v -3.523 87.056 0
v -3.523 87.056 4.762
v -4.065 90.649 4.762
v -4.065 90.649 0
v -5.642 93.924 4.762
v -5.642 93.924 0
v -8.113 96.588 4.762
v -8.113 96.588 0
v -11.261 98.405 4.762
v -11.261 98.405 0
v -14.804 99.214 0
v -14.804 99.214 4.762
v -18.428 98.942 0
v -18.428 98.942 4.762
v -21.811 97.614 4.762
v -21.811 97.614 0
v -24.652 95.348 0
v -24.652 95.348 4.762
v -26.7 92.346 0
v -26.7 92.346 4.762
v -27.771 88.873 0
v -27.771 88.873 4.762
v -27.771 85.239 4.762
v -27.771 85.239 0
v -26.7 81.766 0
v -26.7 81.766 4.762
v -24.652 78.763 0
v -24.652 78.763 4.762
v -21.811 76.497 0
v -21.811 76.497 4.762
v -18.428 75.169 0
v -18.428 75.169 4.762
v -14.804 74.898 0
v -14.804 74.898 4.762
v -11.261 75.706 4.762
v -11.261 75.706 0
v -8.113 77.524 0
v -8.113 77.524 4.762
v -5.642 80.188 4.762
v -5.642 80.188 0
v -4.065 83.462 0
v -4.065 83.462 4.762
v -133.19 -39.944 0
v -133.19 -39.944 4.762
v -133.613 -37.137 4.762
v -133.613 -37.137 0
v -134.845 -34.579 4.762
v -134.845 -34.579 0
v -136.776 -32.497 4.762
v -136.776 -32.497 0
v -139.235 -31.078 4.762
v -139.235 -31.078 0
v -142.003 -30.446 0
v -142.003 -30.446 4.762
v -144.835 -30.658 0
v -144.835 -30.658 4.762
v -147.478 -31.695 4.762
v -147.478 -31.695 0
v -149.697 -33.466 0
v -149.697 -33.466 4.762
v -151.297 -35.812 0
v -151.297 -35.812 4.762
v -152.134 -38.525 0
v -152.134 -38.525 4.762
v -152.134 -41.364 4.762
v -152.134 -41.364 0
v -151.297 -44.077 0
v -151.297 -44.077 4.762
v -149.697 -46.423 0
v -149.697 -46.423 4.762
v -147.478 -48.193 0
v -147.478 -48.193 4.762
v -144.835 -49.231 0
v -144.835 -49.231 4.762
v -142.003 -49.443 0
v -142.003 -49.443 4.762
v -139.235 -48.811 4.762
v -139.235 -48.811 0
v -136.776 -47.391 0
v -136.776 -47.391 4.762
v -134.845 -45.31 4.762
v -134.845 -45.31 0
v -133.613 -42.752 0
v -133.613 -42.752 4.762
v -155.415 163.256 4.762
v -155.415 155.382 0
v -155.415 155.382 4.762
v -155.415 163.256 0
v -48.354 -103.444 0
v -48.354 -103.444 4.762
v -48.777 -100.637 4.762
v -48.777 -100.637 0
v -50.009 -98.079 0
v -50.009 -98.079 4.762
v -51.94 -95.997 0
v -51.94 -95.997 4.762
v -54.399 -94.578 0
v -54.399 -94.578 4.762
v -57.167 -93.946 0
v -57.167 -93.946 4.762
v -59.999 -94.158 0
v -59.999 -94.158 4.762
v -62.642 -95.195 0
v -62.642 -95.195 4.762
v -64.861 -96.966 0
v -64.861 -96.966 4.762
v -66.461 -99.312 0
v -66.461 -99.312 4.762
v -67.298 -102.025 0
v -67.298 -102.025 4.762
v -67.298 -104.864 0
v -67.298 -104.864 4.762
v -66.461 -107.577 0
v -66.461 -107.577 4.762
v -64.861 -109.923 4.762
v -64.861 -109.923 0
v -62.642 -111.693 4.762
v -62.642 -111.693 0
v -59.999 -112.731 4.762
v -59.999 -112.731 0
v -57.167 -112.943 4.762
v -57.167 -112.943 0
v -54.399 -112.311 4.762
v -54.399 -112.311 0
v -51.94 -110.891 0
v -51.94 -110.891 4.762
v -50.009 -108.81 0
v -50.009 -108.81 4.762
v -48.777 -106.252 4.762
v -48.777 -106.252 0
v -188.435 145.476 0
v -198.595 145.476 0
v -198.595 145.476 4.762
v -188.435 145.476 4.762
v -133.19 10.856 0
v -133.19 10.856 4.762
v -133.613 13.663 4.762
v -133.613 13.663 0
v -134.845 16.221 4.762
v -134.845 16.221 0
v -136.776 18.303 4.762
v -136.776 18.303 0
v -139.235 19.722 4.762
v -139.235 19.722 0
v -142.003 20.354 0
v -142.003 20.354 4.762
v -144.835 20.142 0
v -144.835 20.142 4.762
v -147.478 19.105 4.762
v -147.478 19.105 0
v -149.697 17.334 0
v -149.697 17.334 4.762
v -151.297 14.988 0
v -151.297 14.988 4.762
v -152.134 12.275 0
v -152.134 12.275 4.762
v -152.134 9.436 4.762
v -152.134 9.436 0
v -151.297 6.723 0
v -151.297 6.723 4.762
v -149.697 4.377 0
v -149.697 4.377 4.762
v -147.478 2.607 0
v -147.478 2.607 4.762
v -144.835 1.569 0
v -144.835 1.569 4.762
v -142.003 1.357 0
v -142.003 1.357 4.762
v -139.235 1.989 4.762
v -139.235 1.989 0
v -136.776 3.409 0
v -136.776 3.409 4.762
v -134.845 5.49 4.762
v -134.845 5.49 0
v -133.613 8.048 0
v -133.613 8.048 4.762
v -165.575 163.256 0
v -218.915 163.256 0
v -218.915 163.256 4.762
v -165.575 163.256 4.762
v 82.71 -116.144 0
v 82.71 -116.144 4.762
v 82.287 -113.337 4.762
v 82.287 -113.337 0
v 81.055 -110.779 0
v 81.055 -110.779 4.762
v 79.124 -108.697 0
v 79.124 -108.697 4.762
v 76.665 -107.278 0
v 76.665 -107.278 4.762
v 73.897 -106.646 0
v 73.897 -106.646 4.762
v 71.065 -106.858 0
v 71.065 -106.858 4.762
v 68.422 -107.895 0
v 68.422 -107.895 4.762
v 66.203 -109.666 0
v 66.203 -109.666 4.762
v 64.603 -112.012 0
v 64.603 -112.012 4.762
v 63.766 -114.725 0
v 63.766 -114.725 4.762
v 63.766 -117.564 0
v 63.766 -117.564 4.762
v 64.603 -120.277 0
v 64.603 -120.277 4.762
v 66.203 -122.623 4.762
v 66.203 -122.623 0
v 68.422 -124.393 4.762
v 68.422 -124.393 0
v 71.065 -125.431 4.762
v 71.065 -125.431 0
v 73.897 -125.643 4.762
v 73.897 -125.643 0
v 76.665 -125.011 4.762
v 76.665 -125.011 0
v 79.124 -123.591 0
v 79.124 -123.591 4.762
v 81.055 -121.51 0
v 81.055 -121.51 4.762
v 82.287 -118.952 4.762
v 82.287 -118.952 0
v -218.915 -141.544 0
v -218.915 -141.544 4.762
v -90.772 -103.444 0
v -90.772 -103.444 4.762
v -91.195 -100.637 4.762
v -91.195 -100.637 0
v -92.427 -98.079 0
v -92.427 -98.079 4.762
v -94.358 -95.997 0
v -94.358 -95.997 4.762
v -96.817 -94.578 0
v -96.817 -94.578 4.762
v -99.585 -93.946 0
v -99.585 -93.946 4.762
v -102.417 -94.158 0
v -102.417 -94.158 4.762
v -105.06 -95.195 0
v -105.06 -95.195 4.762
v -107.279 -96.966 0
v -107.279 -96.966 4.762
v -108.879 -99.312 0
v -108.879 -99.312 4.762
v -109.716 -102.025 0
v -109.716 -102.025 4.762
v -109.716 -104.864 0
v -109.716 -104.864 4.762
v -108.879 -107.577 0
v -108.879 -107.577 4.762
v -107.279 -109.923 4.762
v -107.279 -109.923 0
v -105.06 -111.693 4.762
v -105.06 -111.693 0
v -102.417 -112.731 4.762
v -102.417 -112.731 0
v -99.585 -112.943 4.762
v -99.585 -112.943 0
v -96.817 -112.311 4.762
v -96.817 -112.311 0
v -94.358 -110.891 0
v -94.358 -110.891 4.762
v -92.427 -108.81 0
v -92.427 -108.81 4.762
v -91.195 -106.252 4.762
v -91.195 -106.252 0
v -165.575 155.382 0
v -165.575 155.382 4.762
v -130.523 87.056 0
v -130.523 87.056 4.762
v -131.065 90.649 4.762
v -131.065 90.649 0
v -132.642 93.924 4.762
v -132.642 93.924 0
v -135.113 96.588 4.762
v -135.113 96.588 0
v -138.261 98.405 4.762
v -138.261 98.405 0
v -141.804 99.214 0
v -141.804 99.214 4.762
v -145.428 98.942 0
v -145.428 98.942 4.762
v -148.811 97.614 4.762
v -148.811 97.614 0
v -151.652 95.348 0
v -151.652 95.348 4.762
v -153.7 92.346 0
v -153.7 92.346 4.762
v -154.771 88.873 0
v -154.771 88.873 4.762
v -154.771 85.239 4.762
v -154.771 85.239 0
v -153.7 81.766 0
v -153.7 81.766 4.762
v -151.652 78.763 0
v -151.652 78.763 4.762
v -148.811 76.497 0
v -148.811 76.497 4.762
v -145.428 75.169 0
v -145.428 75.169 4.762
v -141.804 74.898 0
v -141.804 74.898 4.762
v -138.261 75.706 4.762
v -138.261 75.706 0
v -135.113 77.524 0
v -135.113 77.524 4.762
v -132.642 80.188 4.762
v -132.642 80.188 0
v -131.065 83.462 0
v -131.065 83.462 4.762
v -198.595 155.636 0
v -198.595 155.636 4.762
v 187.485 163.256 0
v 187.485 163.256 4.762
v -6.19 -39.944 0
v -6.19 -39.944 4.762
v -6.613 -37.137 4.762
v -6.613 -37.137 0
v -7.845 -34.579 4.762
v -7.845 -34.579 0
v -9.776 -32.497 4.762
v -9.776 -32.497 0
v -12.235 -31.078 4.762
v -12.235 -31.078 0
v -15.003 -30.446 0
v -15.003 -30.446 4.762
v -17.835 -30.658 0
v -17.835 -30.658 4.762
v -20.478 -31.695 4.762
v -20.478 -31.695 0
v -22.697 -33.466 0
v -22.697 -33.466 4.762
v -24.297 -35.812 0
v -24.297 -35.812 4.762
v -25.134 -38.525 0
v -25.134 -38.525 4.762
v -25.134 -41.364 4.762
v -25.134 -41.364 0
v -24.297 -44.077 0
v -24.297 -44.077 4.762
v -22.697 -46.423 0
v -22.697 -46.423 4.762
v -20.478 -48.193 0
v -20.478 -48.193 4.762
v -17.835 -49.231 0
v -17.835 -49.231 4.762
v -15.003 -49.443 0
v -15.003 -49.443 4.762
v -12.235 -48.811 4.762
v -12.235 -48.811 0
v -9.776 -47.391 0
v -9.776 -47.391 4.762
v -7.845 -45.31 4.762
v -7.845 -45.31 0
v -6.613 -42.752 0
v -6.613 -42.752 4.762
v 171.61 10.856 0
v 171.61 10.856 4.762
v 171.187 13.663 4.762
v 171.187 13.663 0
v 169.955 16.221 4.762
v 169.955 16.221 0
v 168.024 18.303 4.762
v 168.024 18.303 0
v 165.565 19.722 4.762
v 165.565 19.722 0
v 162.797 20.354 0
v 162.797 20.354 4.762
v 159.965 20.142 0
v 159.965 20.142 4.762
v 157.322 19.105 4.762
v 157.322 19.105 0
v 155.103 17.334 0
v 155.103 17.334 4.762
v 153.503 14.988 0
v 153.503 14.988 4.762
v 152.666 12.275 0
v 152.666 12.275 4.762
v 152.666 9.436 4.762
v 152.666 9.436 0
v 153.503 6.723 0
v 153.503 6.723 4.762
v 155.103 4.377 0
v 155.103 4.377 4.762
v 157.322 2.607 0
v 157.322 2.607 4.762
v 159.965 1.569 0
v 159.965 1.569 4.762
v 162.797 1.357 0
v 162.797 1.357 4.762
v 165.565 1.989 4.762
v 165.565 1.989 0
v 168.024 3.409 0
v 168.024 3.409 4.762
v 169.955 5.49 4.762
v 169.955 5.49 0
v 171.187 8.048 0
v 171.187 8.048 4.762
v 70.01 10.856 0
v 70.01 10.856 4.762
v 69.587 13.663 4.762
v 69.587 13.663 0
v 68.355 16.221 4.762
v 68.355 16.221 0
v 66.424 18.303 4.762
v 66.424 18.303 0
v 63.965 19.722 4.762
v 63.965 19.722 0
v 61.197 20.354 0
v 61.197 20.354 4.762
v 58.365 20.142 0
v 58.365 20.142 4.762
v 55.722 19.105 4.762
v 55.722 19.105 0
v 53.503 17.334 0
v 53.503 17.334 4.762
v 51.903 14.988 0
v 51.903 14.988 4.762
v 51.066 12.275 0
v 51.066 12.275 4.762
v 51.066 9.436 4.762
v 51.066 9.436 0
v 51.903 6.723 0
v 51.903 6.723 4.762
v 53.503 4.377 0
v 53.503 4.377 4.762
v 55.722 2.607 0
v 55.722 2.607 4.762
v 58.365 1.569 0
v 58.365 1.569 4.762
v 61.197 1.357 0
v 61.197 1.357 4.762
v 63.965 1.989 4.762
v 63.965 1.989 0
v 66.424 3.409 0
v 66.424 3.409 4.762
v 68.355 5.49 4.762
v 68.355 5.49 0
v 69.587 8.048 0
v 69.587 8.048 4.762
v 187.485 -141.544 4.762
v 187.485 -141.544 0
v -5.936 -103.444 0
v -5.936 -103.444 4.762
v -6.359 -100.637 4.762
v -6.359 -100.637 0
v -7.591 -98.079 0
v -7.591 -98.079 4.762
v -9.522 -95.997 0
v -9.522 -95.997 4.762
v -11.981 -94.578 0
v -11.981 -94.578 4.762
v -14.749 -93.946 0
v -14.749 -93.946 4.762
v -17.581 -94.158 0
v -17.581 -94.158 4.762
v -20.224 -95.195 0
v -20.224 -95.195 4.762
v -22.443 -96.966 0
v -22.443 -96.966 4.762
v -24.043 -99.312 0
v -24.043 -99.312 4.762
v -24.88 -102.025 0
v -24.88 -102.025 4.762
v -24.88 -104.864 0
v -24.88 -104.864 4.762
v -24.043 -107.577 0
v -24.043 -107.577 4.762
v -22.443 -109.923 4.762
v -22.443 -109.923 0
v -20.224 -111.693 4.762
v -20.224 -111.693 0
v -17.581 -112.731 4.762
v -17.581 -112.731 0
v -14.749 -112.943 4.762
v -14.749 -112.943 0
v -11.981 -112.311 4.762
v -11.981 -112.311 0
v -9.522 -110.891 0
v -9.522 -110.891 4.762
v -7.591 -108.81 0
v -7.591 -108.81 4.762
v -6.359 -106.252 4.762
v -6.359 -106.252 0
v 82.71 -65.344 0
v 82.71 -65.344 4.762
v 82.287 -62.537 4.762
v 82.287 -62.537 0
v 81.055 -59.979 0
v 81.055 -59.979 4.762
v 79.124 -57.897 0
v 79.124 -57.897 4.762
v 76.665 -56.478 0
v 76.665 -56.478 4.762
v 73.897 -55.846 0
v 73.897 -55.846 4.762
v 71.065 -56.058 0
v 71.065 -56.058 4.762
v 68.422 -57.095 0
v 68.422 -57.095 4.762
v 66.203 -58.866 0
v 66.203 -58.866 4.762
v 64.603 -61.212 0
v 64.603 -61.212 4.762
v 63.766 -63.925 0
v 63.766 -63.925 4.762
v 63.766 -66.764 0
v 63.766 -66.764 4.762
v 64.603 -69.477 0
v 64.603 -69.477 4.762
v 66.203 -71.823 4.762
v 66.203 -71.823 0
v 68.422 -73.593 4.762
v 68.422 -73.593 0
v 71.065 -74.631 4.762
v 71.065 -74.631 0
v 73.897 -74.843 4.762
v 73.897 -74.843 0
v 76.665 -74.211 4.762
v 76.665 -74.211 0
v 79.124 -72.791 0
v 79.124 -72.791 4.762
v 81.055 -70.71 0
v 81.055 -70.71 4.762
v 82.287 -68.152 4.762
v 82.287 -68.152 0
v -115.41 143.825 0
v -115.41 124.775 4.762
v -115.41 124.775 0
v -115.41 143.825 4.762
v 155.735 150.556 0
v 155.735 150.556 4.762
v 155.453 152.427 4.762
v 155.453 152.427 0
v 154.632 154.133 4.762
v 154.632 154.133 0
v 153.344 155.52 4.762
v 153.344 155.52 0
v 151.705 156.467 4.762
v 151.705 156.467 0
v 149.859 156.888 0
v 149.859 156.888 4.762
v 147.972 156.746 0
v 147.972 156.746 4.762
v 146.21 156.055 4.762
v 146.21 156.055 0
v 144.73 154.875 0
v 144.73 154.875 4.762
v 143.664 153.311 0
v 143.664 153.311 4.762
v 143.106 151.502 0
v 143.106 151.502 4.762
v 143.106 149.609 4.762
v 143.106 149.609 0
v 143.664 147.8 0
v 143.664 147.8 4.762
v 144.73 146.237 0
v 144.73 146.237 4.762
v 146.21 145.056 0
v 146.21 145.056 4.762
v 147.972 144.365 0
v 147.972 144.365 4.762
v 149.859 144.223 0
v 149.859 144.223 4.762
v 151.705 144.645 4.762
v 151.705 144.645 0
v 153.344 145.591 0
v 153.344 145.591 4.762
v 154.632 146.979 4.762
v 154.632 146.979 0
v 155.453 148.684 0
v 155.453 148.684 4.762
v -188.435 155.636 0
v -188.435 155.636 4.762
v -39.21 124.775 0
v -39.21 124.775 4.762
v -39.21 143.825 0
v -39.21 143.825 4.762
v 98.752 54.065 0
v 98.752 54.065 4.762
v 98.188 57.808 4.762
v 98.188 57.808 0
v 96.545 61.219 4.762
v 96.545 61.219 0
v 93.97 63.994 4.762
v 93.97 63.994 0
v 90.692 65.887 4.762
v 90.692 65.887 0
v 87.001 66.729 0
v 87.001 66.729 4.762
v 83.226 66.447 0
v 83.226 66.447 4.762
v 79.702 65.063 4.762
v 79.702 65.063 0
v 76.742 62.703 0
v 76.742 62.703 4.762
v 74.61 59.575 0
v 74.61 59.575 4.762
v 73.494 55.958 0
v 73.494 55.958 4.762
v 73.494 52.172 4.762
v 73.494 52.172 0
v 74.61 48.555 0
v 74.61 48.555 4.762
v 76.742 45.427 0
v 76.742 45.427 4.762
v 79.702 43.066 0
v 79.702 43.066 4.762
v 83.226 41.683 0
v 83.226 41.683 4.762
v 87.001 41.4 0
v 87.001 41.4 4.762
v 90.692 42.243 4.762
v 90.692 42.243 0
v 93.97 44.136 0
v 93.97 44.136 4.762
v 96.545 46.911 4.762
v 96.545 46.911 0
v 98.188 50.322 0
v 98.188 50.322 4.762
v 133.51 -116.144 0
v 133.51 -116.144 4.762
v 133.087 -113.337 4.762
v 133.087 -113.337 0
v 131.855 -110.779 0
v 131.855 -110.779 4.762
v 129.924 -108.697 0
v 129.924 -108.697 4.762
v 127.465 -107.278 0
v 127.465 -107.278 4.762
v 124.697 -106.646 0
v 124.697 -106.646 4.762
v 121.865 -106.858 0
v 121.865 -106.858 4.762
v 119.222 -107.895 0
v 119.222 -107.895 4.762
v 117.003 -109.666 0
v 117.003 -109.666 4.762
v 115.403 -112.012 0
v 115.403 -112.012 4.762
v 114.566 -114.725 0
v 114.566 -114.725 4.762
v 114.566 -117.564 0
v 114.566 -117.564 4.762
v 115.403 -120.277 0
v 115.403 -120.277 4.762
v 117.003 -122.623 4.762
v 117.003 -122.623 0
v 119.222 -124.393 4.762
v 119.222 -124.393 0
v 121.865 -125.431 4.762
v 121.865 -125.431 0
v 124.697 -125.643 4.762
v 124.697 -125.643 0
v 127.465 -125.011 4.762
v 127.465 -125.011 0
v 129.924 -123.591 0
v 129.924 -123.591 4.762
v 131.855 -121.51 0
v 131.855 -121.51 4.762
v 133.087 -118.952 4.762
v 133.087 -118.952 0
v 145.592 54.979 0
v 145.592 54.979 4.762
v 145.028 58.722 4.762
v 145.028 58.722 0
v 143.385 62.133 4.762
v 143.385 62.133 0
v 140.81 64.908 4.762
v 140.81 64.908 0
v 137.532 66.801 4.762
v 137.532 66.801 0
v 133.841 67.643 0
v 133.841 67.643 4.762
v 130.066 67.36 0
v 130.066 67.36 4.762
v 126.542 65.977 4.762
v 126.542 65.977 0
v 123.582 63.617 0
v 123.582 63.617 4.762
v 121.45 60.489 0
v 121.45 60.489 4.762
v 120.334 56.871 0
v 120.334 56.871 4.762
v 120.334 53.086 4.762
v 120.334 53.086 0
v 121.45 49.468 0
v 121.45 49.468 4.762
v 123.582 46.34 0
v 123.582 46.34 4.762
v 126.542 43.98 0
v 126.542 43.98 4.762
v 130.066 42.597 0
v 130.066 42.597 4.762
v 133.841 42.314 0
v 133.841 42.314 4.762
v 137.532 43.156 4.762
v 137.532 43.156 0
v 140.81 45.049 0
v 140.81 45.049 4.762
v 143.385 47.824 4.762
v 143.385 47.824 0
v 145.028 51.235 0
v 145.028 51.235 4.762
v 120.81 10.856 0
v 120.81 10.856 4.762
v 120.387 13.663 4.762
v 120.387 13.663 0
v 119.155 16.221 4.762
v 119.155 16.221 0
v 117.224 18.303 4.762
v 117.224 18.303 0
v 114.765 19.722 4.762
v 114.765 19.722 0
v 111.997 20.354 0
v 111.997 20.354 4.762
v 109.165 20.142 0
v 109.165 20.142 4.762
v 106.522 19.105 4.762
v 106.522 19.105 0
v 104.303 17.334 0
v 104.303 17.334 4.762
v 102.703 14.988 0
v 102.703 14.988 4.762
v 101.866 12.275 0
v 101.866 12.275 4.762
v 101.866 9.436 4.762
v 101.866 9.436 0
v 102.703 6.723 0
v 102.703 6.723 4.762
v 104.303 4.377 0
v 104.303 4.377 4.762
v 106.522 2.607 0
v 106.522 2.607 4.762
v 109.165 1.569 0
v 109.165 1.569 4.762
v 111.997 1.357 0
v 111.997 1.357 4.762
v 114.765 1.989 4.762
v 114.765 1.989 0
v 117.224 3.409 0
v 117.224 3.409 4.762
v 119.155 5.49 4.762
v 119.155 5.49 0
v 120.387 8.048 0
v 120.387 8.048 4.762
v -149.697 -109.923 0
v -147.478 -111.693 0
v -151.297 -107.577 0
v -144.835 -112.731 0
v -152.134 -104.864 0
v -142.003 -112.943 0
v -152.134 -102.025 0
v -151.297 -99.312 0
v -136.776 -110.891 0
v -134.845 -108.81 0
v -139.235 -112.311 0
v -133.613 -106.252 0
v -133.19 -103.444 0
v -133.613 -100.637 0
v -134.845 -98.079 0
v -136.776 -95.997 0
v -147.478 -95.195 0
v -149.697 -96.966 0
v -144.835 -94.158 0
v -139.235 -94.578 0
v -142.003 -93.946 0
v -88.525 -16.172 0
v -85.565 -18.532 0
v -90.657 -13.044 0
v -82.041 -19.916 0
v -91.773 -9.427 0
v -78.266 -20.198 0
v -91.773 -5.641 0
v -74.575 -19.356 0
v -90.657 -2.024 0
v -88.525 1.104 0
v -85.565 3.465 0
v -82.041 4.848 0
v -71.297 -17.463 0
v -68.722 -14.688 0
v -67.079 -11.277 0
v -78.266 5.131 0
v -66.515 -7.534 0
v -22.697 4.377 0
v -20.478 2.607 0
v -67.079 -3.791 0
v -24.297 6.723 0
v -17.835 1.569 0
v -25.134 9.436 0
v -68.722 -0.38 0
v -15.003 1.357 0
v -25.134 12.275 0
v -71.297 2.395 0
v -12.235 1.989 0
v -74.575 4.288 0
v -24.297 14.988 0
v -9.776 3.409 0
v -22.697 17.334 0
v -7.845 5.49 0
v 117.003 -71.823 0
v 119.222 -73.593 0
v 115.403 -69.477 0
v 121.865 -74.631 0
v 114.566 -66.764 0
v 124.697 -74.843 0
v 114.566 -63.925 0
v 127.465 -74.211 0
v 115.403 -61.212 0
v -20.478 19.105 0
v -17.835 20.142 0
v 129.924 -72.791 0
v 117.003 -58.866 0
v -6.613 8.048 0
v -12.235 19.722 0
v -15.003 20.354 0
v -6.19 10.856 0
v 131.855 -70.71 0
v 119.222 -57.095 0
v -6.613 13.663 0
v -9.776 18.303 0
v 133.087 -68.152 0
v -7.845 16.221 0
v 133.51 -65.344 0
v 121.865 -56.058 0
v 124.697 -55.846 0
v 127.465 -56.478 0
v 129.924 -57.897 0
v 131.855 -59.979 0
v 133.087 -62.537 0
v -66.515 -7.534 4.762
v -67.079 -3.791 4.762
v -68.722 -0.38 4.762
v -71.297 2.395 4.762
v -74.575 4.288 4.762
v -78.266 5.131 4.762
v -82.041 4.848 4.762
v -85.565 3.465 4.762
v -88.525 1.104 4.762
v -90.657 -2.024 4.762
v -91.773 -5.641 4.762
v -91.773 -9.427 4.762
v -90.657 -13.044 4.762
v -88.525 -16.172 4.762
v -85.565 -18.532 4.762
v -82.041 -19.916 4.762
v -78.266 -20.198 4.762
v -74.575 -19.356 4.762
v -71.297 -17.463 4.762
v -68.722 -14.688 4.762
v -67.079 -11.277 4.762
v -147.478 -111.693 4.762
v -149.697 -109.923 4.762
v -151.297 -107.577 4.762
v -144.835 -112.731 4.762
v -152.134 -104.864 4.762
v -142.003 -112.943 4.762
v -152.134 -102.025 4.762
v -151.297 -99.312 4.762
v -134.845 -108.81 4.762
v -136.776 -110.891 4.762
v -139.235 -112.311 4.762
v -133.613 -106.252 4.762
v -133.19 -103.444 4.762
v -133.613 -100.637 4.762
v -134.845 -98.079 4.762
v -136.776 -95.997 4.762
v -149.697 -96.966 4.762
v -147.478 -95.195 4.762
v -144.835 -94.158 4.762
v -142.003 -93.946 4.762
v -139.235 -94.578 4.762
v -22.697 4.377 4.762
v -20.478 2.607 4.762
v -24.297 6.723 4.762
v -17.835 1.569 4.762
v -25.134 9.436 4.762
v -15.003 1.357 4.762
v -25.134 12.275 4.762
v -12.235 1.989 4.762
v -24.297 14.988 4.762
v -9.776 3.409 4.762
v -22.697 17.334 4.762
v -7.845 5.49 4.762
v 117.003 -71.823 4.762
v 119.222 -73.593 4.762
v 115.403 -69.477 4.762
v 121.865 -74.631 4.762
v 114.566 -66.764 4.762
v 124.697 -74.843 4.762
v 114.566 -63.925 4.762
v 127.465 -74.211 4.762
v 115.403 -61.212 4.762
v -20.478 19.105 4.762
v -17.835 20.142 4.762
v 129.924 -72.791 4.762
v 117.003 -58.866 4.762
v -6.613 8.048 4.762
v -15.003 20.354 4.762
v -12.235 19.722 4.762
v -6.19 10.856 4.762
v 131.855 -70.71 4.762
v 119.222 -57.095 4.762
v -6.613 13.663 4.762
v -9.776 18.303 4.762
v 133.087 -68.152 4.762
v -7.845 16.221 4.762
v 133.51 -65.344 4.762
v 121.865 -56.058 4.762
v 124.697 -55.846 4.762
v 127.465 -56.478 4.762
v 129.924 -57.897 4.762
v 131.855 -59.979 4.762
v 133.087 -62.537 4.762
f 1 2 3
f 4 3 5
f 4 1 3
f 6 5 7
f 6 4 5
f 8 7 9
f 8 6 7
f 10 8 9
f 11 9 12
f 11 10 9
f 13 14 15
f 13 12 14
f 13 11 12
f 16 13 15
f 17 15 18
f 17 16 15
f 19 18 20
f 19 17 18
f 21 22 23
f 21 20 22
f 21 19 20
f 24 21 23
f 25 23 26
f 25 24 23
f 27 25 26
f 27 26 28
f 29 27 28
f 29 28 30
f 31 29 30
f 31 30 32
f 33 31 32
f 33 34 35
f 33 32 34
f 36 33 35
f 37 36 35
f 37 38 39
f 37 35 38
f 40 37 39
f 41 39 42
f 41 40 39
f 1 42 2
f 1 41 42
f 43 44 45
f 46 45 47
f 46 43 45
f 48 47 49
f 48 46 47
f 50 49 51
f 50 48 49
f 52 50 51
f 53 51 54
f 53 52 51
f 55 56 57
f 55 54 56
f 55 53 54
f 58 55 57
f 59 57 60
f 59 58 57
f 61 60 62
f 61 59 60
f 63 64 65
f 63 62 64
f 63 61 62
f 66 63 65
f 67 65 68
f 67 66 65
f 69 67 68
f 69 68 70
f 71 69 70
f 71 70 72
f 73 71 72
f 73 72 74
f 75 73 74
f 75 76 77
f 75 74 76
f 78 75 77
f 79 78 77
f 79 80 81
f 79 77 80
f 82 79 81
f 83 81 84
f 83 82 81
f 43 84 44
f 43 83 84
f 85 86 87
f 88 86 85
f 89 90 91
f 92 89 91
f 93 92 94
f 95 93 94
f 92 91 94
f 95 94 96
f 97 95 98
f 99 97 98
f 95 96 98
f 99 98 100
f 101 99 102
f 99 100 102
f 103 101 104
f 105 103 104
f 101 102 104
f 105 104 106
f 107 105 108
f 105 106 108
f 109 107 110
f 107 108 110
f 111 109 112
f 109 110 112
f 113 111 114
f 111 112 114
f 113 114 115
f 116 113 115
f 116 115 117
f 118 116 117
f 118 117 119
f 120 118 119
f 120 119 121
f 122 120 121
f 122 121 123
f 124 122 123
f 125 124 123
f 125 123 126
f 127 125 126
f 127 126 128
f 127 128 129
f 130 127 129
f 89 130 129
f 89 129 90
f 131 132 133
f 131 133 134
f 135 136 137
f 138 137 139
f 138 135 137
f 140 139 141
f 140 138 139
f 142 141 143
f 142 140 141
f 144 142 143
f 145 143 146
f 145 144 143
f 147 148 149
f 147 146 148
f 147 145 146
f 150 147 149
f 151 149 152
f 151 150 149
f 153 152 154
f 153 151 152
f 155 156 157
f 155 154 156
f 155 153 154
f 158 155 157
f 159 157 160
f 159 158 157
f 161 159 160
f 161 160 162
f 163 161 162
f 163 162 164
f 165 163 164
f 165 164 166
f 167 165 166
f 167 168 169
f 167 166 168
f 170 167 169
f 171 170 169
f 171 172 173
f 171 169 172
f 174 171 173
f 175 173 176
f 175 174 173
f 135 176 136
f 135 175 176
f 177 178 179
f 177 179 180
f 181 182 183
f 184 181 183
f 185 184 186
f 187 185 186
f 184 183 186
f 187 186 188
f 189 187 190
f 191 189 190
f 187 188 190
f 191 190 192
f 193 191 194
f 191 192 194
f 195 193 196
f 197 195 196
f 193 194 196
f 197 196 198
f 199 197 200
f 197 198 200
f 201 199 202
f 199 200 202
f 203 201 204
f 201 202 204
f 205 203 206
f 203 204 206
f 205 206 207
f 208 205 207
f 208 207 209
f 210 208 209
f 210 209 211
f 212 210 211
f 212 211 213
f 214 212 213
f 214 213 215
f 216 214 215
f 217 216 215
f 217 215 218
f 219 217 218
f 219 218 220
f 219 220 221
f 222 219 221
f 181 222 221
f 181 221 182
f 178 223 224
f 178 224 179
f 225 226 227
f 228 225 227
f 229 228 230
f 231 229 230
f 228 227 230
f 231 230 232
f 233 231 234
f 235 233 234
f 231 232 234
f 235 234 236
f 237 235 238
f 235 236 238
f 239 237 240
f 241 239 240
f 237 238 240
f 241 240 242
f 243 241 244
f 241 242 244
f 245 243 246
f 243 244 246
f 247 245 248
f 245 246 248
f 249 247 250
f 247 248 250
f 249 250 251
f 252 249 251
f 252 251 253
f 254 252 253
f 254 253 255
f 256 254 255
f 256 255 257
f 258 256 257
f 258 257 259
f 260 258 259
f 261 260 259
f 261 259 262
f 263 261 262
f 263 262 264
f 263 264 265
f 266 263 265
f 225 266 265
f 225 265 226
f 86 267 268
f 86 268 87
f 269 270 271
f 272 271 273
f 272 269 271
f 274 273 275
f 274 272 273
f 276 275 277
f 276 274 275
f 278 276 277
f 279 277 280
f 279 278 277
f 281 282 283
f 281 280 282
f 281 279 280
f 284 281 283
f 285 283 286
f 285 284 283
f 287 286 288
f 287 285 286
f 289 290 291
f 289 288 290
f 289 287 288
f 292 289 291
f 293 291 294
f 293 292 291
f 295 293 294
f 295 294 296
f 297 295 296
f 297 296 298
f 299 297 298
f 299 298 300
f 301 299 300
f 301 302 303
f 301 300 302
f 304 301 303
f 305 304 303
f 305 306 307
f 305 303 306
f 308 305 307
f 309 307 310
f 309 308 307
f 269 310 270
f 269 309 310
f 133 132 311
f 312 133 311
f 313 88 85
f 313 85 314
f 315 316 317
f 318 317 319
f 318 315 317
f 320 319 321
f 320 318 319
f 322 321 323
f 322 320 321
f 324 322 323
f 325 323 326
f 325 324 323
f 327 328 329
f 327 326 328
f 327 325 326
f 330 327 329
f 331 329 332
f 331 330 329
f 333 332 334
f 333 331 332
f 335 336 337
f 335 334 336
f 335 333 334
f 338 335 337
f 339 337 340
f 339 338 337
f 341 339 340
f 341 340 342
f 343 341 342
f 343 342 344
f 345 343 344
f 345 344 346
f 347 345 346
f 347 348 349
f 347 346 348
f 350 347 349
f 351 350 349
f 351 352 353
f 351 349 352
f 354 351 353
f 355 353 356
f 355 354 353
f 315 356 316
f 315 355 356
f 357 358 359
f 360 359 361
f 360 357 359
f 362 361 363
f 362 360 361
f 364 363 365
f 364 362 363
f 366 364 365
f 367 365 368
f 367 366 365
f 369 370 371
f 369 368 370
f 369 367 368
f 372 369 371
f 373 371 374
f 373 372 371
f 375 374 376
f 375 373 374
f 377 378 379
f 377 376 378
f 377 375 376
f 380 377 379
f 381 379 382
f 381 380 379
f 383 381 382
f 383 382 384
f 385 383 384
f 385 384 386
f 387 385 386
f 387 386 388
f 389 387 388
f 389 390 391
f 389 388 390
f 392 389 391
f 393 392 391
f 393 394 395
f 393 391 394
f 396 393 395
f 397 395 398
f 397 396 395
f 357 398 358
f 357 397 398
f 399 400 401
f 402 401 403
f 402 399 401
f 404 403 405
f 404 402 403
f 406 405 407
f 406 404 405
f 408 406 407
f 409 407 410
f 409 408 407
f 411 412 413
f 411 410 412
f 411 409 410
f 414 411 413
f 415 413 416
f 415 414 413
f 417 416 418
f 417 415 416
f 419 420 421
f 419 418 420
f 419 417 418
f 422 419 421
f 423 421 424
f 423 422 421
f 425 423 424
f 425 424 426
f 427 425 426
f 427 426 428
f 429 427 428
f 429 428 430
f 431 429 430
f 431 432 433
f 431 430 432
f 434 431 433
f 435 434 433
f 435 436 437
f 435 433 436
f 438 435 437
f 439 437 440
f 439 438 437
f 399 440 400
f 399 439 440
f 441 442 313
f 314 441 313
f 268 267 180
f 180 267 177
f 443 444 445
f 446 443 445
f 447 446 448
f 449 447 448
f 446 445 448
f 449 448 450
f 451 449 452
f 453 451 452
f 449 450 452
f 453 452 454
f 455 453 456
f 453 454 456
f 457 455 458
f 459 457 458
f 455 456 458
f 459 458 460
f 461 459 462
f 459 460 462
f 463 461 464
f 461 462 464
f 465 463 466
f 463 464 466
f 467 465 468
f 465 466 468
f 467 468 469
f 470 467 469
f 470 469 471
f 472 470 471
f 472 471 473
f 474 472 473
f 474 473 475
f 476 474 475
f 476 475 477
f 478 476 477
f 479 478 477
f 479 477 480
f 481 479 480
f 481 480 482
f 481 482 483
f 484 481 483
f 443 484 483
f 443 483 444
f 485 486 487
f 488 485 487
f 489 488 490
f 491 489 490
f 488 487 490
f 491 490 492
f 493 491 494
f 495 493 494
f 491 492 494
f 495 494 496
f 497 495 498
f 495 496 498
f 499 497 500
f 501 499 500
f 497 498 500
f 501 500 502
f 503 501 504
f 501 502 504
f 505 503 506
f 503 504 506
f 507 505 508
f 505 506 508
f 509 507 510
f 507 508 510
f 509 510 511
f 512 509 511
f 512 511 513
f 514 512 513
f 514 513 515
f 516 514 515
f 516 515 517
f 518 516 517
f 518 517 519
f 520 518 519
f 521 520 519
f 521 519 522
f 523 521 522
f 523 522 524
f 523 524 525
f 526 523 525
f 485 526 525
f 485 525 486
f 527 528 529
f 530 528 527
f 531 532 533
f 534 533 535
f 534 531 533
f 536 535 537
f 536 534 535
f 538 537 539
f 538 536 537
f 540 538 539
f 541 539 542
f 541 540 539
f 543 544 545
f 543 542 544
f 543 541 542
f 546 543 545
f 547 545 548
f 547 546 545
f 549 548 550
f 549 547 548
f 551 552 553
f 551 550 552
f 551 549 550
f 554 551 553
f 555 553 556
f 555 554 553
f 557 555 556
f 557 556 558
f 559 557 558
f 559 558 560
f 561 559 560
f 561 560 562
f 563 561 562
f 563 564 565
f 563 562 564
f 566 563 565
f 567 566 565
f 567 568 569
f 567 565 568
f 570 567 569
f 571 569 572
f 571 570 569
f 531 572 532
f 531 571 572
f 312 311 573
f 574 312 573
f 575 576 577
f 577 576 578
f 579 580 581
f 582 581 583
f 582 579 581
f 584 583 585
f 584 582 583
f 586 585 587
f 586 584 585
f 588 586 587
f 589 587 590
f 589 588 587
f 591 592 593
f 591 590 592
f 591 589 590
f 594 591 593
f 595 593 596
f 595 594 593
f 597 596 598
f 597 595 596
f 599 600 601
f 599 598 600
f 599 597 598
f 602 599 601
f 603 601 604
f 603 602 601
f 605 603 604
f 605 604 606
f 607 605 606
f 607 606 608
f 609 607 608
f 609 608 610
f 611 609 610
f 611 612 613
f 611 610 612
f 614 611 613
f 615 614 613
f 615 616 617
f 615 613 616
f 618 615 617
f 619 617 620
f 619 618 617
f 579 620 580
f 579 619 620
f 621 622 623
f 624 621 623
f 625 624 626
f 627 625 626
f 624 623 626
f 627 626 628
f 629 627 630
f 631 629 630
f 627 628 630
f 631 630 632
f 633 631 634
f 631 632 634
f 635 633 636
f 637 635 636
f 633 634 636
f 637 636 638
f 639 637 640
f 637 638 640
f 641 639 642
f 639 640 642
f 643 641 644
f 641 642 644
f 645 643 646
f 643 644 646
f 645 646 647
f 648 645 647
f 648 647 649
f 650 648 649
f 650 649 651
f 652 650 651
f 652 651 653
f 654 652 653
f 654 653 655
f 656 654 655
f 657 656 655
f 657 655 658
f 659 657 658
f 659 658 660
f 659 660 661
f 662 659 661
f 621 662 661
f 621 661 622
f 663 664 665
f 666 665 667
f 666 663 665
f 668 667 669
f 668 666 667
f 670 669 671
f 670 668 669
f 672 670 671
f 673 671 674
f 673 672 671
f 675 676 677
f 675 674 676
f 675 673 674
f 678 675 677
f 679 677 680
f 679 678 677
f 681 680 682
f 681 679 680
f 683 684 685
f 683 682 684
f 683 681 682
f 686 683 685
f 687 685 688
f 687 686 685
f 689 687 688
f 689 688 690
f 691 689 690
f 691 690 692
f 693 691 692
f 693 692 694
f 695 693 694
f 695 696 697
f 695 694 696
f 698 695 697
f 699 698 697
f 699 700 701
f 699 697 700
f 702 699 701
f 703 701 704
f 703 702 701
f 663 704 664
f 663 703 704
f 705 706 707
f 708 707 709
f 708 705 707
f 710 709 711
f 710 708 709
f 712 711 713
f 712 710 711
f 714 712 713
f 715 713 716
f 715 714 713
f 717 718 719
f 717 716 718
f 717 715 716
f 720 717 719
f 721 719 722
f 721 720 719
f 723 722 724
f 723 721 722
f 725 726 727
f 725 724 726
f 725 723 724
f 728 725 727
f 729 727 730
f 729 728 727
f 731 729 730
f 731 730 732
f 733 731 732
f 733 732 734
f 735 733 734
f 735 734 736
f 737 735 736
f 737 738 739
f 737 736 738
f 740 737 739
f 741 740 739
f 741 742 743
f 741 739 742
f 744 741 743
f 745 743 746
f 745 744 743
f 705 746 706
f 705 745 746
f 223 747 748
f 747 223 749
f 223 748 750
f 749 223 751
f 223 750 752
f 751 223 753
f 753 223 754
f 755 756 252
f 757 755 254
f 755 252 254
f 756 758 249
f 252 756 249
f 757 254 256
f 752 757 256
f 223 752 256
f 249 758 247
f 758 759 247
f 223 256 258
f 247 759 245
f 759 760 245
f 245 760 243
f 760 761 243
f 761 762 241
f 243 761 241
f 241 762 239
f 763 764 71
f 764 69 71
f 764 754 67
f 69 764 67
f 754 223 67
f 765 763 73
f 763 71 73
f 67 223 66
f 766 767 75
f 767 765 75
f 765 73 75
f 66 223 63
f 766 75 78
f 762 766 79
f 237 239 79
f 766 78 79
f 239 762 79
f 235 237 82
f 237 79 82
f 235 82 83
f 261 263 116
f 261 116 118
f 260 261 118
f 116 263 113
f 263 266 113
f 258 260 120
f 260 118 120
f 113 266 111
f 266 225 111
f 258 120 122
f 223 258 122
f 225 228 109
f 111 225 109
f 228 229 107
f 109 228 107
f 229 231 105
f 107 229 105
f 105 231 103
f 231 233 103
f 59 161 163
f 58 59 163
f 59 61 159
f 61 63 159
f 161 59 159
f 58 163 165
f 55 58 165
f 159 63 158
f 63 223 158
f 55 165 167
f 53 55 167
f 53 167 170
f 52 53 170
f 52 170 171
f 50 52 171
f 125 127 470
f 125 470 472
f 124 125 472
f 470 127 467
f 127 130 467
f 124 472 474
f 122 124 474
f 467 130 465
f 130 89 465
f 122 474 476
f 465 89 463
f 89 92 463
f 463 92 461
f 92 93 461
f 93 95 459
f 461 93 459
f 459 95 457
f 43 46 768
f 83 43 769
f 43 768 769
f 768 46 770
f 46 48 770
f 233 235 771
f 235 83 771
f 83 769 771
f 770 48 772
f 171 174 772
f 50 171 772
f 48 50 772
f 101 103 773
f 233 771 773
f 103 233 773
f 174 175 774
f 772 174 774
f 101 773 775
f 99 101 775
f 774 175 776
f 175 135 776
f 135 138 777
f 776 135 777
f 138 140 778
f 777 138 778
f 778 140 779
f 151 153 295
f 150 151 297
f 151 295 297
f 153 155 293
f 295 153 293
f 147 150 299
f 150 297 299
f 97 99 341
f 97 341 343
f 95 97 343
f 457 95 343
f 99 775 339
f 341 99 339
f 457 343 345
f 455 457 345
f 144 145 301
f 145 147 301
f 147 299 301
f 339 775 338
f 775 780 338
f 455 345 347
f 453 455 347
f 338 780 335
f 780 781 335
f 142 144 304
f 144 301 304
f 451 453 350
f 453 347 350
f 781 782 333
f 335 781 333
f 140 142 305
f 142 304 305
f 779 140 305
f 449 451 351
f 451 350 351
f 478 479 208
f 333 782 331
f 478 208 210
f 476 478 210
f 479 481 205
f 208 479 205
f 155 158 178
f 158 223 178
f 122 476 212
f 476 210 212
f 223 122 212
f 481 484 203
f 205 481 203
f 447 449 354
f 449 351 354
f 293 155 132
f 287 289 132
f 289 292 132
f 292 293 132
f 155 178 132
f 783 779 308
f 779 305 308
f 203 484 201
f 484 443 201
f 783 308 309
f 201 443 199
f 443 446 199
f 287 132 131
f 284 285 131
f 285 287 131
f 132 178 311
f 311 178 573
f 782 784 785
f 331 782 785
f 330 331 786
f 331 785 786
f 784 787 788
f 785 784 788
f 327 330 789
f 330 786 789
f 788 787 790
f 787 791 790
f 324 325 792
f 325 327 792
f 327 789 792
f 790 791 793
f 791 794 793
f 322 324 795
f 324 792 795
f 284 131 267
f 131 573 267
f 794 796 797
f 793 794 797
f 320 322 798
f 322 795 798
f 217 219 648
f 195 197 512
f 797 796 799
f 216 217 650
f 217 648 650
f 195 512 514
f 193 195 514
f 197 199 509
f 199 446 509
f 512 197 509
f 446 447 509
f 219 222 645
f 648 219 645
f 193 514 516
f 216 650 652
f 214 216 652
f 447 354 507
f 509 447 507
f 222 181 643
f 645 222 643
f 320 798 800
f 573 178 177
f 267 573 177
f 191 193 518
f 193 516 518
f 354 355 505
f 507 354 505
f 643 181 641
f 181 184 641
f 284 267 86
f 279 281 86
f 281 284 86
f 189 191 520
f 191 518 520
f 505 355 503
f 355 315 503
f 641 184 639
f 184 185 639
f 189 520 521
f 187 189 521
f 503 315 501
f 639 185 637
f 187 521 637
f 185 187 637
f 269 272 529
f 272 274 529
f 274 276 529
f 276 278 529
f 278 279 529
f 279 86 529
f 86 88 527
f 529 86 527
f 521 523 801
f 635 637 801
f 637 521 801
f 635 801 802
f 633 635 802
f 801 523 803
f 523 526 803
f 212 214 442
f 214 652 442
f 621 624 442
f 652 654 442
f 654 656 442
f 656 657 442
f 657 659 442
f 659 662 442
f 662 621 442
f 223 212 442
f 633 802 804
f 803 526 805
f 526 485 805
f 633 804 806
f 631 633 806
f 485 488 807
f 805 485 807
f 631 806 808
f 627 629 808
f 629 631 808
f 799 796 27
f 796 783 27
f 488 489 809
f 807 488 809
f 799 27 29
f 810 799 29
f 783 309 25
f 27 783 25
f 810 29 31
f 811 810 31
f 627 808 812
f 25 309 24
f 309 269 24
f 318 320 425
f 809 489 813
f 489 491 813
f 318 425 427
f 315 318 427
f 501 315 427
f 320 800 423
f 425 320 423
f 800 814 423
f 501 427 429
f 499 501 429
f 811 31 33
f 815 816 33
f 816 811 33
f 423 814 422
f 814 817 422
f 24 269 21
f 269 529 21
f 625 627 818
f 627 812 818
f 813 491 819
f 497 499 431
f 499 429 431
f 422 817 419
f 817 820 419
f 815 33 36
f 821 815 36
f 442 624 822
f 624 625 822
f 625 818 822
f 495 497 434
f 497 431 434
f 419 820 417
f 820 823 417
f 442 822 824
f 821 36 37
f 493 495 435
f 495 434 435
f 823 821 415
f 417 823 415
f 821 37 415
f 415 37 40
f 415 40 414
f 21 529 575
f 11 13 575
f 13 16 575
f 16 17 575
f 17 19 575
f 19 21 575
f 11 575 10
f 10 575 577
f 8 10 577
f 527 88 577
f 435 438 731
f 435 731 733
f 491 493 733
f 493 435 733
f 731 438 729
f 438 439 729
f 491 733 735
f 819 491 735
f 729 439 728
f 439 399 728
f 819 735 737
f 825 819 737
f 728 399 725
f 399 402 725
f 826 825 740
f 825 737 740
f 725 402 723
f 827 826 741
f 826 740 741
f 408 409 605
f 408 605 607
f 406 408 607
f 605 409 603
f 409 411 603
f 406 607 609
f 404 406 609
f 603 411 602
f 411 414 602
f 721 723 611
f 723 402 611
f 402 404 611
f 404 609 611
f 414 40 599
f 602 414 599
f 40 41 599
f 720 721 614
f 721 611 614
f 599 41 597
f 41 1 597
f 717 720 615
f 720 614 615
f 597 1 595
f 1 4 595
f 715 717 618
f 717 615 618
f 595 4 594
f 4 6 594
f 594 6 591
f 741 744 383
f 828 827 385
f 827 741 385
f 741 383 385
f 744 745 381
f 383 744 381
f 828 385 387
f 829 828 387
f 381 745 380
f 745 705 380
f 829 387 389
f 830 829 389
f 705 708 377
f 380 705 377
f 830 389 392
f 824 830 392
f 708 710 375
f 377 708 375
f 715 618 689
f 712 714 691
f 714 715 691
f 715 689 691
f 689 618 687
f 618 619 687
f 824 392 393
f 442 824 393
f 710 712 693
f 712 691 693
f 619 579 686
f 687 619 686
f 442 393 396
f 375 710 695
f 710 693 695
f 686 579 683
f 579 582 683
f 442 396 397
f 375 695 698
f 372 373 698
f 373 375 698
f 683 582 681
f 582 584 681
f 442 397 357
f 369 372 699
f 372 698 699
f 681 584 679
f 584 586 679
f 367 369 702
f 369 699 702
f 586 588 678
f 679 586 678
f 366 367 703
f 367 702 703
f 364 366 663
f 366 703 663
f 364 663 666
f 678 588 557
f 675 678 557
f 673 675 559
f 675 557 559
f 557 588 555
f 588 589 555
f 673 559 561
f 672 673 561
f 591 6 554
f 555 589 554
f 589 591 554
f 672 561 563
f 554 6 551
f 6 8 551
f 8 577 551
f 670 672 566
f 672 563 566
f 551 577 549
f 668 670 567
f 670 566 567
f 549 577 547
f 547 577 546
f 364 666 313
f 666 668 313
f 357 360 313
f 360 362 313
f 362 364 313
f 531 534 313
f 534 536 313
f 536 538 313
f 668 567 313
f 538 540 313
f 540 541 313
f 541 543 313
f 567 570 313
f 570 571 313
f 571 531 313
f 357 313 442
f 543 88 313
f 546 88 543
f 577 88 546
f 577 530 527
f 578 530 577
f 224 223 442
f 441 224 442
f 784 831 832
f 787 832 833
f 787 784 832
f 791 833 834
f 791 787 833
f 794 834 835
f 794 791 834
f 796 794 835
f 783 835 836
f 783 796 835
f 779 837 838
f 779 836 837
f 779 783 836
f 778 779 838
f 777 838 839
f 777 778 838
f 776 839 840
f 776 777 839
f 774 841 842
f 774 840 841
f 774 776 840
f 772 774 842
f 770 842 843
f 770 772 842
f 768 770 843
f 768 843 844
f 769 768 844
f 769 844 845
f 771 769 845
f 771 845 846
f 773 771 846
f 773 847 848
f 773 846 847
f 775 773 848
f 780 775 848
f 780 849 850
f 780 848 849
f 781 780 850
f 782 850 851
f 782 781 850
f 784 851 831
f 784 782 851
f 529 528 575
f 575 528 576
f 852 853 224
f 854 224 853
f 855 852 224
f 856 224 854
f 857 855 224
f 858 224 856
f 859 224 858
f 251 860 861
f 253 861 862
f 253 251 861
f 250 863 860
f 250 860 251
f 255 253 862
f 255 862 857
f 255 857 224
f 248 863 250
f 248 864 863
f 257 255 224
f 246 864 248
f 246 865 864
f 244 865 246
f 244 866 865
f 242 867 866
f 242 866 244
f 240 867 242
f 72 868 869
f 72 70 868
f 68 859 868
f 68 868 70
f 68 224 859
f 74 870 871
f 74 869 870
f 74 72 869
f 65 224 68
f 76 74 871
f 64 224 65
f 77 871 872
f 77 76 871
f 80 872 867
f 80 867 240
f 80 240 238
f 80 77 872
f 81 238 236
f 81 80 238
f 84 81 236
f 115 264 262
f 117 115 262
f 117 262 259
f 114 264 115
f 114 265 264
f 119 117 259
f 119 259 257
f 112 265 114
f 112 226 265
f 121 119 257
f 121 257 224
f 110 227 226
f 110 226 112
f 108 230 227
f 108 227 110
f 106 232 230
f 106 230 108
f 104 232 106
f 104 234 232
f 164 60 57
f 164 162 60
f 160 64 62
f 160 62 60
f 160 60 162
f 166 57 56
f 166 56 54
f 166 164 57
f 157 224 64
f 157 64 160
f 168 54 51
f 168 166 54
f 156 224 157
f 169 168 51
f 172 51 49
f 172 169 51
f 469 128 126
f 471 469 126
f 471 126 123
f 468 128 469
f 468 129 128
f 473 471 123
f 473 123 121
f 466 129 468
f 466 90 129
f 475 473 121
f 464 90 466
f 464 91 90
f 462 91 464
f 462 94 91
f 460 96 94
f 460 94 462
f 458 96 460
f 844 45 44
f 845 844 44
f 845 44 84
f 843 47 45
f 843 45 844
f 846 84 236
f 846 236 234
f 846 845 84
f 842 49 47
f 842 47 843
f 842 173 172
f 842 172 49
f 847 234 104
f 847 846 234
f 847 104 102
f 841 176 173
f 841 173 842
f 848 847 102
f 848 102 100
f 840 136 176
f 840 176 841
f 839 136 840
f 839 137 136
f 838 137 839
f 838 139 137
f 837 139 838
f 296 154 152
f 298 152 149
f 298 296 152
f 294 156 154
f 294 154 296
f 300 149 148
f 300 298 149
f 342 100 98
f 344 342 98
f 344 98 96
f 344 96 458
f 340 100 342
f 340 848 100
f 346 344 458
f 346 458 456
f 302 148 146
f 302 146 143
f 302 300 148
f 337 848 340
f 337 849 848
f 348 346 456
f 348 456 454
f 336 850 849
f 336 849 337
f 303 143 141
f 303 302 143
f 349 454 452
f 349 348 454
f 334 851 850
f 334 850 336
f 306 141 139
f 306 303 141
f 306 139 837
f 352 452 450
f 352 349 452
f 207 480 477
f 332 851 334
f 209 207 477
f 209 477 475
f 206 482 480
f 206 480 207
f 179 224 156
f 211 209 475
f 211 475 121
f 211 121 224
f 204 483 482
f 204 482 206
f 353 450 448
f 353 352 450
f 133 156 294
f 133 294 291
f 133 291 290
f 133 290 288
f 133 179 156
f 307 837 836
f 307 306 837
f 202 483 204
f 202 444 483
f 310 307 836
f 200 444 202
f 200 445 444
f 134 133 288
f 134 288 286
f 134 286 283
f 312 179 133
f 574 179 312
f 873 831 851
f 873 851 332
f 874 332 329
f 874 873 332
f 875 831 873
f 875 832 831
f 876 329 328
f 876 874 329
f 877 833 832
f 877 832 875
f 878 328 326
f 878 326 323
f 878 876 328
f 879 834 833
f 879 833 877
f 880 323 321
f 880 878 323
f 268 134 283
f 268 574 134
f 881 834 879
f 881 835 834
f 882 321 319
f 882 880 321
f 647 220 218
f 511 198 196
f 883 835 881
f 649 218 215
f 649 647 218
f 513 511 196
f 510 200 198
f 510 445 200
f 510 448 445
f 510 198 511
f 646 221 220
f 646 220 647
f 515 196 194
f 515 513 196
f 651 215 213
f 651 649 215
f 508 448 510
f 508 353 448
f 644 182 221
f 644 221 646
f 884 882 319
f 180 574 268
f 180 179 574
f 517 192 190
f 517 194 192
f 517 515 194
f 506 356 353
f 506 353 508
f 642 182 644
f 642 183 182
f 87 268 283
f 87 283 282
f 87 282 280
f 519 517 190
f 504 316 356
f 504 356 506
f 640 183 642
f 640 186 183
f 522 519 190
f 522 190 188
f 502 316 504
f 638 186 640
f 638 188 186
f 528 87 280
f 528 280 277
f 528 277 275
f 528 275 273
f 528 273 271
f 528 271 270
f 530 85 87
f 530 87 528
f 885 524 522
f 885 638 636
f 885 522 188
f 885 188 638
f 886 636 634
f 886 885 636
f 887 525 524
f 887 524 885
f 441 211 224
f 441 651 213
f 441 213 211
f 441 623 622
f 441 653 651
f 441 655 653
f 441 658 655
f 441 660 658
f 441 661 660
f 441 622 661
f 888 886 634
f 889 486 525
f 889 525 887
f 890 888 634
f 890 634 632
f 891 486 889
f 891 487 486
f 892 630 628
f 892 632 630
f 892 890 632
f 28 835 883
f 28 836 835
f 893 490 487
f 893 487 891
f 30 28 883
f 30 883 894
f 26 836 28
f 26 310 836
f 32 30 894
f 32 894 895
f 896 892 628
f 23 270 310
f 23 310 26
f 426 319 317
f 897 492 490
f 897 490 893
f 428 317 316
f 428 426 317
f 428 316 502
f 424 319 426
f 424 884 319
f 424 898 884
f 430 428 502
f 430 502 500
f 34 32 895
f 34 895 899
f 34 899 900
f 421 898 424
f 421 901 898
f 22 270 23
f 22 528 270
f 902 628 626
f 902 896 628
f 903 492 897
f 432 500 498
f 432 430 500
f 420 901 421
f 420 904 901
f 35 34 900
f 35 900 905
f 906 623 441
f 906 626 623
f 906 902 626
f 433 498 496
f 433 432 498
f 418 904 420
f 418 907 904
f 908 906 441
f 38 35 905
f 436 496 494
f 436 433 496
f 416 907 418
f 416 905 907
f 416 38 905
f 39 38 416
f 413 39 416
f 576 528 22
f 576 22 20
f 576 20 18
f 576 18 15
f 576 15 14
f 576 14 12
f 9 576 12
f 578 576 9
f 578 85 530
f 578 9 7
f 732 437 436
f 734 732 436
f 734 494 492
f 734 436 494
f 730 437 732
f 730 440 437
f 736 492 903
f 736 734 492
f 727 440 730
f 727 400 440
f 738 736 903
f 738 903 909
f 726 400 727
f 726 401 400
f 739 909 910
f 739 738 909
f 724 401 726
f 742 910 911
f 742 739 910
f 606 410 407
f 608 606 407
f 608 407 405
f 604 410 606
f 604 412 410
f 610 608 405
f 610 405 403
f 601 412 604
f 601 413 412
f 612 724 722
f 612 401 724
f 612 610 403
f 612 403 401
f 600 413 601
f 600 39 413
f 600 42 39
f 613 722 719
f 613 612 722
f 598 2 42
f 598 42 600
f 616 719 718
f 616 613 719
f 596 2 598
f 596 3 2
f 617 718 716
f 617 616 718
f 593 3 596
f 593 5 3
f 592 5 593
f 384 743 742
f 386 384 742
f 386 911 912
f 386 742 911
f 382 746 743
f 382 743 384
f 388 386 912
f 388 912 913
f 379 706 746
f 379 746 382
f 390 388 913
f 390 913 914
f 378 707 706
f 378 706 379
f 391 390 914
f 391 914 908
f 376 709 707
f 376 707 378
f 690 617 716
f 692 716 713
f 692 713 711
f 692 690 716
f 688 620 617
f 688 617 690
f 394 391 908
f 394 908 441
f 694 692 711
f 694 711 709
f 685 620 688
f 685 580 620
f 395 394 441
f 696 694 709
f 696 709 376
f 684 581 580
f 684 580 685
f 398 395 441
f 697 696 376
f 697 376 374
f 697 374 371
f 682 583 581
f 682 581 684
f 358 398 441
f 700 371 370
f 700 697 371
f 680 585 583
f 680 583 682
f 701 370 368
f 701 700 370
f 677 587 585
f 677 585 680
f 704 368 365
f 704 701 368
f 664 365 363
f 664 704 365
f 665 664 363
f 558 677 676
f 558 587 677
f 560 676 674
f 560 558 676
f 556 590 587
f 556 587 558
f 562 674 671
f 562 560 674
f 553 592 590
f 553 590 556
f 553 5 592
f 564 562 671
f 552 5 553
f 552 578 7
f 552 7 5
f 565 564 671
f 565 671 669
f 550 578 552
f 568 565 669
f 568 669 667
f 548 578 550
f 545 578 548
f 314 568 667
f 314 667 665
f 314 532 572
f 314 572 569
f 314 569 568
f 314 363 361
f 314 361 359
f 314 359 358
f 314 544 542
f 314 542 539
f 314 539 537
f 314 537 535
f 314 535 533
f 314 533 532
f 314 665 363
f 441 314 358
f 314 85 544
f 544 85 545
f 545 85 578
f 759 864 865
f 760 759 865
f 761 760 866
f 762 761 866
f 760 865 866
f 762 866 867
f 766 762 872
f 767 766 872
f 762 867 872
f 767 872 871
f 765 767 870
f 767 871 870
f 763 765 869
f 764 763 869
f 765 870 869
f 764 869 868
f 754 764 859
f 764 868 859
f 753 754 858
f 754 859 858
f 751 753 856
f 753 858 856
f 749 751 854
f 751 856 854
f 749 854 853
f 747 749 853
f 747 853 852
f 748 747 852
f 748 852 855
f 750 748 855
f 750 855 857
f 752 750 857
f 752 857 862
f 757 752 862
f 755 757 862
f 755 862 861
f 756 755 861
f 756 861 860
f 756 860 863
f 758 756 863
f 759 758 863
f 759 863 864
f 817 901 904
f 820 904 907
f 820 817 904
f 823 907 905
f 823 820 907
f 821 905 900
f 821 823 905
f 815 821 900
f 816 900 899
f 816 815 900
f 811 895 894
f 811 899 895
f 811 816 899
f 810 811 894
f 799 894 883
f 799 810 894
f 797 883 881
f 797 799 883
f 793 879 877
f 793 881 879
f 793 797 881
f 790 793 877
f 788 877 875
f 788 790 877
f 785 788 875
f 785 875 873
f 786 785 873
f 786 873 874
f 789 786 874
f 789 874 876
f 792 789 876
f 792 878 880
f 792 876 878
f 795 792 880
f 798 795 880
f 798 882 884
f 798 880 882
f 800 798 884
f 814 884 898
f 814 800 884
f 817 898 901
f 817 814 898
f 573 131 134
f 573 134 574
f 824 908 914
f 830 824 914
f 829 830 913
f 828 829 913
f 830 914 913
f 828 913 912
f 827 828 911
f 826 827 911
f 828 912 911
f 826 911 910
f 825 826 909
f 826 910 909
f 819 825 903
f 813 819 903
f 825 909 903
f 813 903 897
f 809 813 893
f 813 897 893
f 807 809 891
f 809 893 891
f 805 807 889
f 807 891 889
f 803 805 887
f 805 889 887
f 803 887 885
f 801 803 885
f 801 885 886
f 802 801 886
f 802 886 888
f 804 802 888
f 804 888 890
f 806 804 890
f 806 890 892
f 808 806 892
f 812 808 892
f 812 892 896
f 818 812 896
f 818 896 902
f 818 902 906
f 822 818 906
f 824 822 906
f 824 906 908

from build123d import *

# Parameters (mm, degrees)
F0_W     = 406.4
F0_H     = 304.8
F1_DEPTH = 4.7625
F2_R     = 12.192
F2_R_2   = 9.525
F2_W     = 10.16
F2_H     = 7.874
F2_R_3   = 12.7
F2_R_4   = 6.35
F2_R_5   = 3.175
F2_H_2   = 10.16
F3_DEPTH = 25.4
F4_R     = 9.525
F4_W     = 76.2
F4_H     = 19.05
F5_DEPTH = 25.4


with BuildPart() as f1:
    # F0 (on Top) → F1 (new body)
    with BuildSketch(Plane.XY):
        with Locations((-15.715082, 10.855626)):
            Rectangle(F0_W, F0_H)
    extrude(amount=F1_DEPTH)

    # F2 (on Top) → F3 (cut)
    with BuildSketch(Plane.XY):
        with Locations((-142.715082, 87.055626)):
            Circle(F2_R)
        with Locations((-142.715082, 10.855626)):
            Circle(F2_R_2)
        with Locations((-142.715082, -39.944374)):
            Circle(F2_R_2)
        with Locations((-15.715082, -39.944374)):
            Circle(F2_R_2)
        with Locations((-15.715082, 10.855626)):
            Circle(F2_R_2)
        with Locations((-160.495082, 159.318626)):
            Rectangle(F2_W, F2_H)
        with Locations((60.484918, 10.855626)):
            Circle(F2_R_2)
        with Locations((111.284918, 10.855626)):
            Circle(F2_R_2)
        with Locations((162.084918, 10.855626)):
            Circle(F2_R_2)
        with Locations((86.052007, 54.064918)):
            Circle(F2_R_3)
        with Locations((132.892046, 54.978594)):
            Circle(F2_R_3)
        with Locations((-79.215082, -7.533974)):
            Circle(F2_R_3)
        with Locations((149.384918, 150.555626)):
            Circle(F2_R_4)
        with Locations((-52.545082, 131.124626)):
            Circle(F2_R_5)
        with Locations((-103.345082, 131.124626)):
            Circle(F2_R_5)
        with Locations((-193.515082, 150.555626)):
            Rectangle(F2_W, F2_H_2)
        with Locations((-15.715082, 87.055626)):
            Circle(F2_R)
    extrude(amount=F3_DEPTH, mode=Mode.SUBTRACT)

    # F4 (on face) → F5 (cut)
    with BuildSketch(Plane.XY.offset(4.7625)):
        with Locations((-142.715082, -103.444374)):
            Circle(F4_R)
        with Locations((-100.297082, -103.444374)):
            Circle(F4_R)
        with Locations((73.184918, -65.344374)):
            Circle(F4_R)
        with Locations((73.184918, -116.144374)):
            Circle(F4_R)
        with Locations((123.984918, -65.344374)):
            Circle(F4_R)
        with Locations((123.984918, -116.144374)):
            Circle(F4_R)
        with Locations((-57.879082, -103.444374)):
            Circle(F4_R)
        with Locations((-15.461082, -103.444374)):
            Circle(F4_R)
        with Locations((-77.310082, 134.299626)):
            Rectangle(F4_W, F4_H)
    extrude(amount=-F5_DEPTH, mode=Mode.SUBTRACT)


solid = f1.part
